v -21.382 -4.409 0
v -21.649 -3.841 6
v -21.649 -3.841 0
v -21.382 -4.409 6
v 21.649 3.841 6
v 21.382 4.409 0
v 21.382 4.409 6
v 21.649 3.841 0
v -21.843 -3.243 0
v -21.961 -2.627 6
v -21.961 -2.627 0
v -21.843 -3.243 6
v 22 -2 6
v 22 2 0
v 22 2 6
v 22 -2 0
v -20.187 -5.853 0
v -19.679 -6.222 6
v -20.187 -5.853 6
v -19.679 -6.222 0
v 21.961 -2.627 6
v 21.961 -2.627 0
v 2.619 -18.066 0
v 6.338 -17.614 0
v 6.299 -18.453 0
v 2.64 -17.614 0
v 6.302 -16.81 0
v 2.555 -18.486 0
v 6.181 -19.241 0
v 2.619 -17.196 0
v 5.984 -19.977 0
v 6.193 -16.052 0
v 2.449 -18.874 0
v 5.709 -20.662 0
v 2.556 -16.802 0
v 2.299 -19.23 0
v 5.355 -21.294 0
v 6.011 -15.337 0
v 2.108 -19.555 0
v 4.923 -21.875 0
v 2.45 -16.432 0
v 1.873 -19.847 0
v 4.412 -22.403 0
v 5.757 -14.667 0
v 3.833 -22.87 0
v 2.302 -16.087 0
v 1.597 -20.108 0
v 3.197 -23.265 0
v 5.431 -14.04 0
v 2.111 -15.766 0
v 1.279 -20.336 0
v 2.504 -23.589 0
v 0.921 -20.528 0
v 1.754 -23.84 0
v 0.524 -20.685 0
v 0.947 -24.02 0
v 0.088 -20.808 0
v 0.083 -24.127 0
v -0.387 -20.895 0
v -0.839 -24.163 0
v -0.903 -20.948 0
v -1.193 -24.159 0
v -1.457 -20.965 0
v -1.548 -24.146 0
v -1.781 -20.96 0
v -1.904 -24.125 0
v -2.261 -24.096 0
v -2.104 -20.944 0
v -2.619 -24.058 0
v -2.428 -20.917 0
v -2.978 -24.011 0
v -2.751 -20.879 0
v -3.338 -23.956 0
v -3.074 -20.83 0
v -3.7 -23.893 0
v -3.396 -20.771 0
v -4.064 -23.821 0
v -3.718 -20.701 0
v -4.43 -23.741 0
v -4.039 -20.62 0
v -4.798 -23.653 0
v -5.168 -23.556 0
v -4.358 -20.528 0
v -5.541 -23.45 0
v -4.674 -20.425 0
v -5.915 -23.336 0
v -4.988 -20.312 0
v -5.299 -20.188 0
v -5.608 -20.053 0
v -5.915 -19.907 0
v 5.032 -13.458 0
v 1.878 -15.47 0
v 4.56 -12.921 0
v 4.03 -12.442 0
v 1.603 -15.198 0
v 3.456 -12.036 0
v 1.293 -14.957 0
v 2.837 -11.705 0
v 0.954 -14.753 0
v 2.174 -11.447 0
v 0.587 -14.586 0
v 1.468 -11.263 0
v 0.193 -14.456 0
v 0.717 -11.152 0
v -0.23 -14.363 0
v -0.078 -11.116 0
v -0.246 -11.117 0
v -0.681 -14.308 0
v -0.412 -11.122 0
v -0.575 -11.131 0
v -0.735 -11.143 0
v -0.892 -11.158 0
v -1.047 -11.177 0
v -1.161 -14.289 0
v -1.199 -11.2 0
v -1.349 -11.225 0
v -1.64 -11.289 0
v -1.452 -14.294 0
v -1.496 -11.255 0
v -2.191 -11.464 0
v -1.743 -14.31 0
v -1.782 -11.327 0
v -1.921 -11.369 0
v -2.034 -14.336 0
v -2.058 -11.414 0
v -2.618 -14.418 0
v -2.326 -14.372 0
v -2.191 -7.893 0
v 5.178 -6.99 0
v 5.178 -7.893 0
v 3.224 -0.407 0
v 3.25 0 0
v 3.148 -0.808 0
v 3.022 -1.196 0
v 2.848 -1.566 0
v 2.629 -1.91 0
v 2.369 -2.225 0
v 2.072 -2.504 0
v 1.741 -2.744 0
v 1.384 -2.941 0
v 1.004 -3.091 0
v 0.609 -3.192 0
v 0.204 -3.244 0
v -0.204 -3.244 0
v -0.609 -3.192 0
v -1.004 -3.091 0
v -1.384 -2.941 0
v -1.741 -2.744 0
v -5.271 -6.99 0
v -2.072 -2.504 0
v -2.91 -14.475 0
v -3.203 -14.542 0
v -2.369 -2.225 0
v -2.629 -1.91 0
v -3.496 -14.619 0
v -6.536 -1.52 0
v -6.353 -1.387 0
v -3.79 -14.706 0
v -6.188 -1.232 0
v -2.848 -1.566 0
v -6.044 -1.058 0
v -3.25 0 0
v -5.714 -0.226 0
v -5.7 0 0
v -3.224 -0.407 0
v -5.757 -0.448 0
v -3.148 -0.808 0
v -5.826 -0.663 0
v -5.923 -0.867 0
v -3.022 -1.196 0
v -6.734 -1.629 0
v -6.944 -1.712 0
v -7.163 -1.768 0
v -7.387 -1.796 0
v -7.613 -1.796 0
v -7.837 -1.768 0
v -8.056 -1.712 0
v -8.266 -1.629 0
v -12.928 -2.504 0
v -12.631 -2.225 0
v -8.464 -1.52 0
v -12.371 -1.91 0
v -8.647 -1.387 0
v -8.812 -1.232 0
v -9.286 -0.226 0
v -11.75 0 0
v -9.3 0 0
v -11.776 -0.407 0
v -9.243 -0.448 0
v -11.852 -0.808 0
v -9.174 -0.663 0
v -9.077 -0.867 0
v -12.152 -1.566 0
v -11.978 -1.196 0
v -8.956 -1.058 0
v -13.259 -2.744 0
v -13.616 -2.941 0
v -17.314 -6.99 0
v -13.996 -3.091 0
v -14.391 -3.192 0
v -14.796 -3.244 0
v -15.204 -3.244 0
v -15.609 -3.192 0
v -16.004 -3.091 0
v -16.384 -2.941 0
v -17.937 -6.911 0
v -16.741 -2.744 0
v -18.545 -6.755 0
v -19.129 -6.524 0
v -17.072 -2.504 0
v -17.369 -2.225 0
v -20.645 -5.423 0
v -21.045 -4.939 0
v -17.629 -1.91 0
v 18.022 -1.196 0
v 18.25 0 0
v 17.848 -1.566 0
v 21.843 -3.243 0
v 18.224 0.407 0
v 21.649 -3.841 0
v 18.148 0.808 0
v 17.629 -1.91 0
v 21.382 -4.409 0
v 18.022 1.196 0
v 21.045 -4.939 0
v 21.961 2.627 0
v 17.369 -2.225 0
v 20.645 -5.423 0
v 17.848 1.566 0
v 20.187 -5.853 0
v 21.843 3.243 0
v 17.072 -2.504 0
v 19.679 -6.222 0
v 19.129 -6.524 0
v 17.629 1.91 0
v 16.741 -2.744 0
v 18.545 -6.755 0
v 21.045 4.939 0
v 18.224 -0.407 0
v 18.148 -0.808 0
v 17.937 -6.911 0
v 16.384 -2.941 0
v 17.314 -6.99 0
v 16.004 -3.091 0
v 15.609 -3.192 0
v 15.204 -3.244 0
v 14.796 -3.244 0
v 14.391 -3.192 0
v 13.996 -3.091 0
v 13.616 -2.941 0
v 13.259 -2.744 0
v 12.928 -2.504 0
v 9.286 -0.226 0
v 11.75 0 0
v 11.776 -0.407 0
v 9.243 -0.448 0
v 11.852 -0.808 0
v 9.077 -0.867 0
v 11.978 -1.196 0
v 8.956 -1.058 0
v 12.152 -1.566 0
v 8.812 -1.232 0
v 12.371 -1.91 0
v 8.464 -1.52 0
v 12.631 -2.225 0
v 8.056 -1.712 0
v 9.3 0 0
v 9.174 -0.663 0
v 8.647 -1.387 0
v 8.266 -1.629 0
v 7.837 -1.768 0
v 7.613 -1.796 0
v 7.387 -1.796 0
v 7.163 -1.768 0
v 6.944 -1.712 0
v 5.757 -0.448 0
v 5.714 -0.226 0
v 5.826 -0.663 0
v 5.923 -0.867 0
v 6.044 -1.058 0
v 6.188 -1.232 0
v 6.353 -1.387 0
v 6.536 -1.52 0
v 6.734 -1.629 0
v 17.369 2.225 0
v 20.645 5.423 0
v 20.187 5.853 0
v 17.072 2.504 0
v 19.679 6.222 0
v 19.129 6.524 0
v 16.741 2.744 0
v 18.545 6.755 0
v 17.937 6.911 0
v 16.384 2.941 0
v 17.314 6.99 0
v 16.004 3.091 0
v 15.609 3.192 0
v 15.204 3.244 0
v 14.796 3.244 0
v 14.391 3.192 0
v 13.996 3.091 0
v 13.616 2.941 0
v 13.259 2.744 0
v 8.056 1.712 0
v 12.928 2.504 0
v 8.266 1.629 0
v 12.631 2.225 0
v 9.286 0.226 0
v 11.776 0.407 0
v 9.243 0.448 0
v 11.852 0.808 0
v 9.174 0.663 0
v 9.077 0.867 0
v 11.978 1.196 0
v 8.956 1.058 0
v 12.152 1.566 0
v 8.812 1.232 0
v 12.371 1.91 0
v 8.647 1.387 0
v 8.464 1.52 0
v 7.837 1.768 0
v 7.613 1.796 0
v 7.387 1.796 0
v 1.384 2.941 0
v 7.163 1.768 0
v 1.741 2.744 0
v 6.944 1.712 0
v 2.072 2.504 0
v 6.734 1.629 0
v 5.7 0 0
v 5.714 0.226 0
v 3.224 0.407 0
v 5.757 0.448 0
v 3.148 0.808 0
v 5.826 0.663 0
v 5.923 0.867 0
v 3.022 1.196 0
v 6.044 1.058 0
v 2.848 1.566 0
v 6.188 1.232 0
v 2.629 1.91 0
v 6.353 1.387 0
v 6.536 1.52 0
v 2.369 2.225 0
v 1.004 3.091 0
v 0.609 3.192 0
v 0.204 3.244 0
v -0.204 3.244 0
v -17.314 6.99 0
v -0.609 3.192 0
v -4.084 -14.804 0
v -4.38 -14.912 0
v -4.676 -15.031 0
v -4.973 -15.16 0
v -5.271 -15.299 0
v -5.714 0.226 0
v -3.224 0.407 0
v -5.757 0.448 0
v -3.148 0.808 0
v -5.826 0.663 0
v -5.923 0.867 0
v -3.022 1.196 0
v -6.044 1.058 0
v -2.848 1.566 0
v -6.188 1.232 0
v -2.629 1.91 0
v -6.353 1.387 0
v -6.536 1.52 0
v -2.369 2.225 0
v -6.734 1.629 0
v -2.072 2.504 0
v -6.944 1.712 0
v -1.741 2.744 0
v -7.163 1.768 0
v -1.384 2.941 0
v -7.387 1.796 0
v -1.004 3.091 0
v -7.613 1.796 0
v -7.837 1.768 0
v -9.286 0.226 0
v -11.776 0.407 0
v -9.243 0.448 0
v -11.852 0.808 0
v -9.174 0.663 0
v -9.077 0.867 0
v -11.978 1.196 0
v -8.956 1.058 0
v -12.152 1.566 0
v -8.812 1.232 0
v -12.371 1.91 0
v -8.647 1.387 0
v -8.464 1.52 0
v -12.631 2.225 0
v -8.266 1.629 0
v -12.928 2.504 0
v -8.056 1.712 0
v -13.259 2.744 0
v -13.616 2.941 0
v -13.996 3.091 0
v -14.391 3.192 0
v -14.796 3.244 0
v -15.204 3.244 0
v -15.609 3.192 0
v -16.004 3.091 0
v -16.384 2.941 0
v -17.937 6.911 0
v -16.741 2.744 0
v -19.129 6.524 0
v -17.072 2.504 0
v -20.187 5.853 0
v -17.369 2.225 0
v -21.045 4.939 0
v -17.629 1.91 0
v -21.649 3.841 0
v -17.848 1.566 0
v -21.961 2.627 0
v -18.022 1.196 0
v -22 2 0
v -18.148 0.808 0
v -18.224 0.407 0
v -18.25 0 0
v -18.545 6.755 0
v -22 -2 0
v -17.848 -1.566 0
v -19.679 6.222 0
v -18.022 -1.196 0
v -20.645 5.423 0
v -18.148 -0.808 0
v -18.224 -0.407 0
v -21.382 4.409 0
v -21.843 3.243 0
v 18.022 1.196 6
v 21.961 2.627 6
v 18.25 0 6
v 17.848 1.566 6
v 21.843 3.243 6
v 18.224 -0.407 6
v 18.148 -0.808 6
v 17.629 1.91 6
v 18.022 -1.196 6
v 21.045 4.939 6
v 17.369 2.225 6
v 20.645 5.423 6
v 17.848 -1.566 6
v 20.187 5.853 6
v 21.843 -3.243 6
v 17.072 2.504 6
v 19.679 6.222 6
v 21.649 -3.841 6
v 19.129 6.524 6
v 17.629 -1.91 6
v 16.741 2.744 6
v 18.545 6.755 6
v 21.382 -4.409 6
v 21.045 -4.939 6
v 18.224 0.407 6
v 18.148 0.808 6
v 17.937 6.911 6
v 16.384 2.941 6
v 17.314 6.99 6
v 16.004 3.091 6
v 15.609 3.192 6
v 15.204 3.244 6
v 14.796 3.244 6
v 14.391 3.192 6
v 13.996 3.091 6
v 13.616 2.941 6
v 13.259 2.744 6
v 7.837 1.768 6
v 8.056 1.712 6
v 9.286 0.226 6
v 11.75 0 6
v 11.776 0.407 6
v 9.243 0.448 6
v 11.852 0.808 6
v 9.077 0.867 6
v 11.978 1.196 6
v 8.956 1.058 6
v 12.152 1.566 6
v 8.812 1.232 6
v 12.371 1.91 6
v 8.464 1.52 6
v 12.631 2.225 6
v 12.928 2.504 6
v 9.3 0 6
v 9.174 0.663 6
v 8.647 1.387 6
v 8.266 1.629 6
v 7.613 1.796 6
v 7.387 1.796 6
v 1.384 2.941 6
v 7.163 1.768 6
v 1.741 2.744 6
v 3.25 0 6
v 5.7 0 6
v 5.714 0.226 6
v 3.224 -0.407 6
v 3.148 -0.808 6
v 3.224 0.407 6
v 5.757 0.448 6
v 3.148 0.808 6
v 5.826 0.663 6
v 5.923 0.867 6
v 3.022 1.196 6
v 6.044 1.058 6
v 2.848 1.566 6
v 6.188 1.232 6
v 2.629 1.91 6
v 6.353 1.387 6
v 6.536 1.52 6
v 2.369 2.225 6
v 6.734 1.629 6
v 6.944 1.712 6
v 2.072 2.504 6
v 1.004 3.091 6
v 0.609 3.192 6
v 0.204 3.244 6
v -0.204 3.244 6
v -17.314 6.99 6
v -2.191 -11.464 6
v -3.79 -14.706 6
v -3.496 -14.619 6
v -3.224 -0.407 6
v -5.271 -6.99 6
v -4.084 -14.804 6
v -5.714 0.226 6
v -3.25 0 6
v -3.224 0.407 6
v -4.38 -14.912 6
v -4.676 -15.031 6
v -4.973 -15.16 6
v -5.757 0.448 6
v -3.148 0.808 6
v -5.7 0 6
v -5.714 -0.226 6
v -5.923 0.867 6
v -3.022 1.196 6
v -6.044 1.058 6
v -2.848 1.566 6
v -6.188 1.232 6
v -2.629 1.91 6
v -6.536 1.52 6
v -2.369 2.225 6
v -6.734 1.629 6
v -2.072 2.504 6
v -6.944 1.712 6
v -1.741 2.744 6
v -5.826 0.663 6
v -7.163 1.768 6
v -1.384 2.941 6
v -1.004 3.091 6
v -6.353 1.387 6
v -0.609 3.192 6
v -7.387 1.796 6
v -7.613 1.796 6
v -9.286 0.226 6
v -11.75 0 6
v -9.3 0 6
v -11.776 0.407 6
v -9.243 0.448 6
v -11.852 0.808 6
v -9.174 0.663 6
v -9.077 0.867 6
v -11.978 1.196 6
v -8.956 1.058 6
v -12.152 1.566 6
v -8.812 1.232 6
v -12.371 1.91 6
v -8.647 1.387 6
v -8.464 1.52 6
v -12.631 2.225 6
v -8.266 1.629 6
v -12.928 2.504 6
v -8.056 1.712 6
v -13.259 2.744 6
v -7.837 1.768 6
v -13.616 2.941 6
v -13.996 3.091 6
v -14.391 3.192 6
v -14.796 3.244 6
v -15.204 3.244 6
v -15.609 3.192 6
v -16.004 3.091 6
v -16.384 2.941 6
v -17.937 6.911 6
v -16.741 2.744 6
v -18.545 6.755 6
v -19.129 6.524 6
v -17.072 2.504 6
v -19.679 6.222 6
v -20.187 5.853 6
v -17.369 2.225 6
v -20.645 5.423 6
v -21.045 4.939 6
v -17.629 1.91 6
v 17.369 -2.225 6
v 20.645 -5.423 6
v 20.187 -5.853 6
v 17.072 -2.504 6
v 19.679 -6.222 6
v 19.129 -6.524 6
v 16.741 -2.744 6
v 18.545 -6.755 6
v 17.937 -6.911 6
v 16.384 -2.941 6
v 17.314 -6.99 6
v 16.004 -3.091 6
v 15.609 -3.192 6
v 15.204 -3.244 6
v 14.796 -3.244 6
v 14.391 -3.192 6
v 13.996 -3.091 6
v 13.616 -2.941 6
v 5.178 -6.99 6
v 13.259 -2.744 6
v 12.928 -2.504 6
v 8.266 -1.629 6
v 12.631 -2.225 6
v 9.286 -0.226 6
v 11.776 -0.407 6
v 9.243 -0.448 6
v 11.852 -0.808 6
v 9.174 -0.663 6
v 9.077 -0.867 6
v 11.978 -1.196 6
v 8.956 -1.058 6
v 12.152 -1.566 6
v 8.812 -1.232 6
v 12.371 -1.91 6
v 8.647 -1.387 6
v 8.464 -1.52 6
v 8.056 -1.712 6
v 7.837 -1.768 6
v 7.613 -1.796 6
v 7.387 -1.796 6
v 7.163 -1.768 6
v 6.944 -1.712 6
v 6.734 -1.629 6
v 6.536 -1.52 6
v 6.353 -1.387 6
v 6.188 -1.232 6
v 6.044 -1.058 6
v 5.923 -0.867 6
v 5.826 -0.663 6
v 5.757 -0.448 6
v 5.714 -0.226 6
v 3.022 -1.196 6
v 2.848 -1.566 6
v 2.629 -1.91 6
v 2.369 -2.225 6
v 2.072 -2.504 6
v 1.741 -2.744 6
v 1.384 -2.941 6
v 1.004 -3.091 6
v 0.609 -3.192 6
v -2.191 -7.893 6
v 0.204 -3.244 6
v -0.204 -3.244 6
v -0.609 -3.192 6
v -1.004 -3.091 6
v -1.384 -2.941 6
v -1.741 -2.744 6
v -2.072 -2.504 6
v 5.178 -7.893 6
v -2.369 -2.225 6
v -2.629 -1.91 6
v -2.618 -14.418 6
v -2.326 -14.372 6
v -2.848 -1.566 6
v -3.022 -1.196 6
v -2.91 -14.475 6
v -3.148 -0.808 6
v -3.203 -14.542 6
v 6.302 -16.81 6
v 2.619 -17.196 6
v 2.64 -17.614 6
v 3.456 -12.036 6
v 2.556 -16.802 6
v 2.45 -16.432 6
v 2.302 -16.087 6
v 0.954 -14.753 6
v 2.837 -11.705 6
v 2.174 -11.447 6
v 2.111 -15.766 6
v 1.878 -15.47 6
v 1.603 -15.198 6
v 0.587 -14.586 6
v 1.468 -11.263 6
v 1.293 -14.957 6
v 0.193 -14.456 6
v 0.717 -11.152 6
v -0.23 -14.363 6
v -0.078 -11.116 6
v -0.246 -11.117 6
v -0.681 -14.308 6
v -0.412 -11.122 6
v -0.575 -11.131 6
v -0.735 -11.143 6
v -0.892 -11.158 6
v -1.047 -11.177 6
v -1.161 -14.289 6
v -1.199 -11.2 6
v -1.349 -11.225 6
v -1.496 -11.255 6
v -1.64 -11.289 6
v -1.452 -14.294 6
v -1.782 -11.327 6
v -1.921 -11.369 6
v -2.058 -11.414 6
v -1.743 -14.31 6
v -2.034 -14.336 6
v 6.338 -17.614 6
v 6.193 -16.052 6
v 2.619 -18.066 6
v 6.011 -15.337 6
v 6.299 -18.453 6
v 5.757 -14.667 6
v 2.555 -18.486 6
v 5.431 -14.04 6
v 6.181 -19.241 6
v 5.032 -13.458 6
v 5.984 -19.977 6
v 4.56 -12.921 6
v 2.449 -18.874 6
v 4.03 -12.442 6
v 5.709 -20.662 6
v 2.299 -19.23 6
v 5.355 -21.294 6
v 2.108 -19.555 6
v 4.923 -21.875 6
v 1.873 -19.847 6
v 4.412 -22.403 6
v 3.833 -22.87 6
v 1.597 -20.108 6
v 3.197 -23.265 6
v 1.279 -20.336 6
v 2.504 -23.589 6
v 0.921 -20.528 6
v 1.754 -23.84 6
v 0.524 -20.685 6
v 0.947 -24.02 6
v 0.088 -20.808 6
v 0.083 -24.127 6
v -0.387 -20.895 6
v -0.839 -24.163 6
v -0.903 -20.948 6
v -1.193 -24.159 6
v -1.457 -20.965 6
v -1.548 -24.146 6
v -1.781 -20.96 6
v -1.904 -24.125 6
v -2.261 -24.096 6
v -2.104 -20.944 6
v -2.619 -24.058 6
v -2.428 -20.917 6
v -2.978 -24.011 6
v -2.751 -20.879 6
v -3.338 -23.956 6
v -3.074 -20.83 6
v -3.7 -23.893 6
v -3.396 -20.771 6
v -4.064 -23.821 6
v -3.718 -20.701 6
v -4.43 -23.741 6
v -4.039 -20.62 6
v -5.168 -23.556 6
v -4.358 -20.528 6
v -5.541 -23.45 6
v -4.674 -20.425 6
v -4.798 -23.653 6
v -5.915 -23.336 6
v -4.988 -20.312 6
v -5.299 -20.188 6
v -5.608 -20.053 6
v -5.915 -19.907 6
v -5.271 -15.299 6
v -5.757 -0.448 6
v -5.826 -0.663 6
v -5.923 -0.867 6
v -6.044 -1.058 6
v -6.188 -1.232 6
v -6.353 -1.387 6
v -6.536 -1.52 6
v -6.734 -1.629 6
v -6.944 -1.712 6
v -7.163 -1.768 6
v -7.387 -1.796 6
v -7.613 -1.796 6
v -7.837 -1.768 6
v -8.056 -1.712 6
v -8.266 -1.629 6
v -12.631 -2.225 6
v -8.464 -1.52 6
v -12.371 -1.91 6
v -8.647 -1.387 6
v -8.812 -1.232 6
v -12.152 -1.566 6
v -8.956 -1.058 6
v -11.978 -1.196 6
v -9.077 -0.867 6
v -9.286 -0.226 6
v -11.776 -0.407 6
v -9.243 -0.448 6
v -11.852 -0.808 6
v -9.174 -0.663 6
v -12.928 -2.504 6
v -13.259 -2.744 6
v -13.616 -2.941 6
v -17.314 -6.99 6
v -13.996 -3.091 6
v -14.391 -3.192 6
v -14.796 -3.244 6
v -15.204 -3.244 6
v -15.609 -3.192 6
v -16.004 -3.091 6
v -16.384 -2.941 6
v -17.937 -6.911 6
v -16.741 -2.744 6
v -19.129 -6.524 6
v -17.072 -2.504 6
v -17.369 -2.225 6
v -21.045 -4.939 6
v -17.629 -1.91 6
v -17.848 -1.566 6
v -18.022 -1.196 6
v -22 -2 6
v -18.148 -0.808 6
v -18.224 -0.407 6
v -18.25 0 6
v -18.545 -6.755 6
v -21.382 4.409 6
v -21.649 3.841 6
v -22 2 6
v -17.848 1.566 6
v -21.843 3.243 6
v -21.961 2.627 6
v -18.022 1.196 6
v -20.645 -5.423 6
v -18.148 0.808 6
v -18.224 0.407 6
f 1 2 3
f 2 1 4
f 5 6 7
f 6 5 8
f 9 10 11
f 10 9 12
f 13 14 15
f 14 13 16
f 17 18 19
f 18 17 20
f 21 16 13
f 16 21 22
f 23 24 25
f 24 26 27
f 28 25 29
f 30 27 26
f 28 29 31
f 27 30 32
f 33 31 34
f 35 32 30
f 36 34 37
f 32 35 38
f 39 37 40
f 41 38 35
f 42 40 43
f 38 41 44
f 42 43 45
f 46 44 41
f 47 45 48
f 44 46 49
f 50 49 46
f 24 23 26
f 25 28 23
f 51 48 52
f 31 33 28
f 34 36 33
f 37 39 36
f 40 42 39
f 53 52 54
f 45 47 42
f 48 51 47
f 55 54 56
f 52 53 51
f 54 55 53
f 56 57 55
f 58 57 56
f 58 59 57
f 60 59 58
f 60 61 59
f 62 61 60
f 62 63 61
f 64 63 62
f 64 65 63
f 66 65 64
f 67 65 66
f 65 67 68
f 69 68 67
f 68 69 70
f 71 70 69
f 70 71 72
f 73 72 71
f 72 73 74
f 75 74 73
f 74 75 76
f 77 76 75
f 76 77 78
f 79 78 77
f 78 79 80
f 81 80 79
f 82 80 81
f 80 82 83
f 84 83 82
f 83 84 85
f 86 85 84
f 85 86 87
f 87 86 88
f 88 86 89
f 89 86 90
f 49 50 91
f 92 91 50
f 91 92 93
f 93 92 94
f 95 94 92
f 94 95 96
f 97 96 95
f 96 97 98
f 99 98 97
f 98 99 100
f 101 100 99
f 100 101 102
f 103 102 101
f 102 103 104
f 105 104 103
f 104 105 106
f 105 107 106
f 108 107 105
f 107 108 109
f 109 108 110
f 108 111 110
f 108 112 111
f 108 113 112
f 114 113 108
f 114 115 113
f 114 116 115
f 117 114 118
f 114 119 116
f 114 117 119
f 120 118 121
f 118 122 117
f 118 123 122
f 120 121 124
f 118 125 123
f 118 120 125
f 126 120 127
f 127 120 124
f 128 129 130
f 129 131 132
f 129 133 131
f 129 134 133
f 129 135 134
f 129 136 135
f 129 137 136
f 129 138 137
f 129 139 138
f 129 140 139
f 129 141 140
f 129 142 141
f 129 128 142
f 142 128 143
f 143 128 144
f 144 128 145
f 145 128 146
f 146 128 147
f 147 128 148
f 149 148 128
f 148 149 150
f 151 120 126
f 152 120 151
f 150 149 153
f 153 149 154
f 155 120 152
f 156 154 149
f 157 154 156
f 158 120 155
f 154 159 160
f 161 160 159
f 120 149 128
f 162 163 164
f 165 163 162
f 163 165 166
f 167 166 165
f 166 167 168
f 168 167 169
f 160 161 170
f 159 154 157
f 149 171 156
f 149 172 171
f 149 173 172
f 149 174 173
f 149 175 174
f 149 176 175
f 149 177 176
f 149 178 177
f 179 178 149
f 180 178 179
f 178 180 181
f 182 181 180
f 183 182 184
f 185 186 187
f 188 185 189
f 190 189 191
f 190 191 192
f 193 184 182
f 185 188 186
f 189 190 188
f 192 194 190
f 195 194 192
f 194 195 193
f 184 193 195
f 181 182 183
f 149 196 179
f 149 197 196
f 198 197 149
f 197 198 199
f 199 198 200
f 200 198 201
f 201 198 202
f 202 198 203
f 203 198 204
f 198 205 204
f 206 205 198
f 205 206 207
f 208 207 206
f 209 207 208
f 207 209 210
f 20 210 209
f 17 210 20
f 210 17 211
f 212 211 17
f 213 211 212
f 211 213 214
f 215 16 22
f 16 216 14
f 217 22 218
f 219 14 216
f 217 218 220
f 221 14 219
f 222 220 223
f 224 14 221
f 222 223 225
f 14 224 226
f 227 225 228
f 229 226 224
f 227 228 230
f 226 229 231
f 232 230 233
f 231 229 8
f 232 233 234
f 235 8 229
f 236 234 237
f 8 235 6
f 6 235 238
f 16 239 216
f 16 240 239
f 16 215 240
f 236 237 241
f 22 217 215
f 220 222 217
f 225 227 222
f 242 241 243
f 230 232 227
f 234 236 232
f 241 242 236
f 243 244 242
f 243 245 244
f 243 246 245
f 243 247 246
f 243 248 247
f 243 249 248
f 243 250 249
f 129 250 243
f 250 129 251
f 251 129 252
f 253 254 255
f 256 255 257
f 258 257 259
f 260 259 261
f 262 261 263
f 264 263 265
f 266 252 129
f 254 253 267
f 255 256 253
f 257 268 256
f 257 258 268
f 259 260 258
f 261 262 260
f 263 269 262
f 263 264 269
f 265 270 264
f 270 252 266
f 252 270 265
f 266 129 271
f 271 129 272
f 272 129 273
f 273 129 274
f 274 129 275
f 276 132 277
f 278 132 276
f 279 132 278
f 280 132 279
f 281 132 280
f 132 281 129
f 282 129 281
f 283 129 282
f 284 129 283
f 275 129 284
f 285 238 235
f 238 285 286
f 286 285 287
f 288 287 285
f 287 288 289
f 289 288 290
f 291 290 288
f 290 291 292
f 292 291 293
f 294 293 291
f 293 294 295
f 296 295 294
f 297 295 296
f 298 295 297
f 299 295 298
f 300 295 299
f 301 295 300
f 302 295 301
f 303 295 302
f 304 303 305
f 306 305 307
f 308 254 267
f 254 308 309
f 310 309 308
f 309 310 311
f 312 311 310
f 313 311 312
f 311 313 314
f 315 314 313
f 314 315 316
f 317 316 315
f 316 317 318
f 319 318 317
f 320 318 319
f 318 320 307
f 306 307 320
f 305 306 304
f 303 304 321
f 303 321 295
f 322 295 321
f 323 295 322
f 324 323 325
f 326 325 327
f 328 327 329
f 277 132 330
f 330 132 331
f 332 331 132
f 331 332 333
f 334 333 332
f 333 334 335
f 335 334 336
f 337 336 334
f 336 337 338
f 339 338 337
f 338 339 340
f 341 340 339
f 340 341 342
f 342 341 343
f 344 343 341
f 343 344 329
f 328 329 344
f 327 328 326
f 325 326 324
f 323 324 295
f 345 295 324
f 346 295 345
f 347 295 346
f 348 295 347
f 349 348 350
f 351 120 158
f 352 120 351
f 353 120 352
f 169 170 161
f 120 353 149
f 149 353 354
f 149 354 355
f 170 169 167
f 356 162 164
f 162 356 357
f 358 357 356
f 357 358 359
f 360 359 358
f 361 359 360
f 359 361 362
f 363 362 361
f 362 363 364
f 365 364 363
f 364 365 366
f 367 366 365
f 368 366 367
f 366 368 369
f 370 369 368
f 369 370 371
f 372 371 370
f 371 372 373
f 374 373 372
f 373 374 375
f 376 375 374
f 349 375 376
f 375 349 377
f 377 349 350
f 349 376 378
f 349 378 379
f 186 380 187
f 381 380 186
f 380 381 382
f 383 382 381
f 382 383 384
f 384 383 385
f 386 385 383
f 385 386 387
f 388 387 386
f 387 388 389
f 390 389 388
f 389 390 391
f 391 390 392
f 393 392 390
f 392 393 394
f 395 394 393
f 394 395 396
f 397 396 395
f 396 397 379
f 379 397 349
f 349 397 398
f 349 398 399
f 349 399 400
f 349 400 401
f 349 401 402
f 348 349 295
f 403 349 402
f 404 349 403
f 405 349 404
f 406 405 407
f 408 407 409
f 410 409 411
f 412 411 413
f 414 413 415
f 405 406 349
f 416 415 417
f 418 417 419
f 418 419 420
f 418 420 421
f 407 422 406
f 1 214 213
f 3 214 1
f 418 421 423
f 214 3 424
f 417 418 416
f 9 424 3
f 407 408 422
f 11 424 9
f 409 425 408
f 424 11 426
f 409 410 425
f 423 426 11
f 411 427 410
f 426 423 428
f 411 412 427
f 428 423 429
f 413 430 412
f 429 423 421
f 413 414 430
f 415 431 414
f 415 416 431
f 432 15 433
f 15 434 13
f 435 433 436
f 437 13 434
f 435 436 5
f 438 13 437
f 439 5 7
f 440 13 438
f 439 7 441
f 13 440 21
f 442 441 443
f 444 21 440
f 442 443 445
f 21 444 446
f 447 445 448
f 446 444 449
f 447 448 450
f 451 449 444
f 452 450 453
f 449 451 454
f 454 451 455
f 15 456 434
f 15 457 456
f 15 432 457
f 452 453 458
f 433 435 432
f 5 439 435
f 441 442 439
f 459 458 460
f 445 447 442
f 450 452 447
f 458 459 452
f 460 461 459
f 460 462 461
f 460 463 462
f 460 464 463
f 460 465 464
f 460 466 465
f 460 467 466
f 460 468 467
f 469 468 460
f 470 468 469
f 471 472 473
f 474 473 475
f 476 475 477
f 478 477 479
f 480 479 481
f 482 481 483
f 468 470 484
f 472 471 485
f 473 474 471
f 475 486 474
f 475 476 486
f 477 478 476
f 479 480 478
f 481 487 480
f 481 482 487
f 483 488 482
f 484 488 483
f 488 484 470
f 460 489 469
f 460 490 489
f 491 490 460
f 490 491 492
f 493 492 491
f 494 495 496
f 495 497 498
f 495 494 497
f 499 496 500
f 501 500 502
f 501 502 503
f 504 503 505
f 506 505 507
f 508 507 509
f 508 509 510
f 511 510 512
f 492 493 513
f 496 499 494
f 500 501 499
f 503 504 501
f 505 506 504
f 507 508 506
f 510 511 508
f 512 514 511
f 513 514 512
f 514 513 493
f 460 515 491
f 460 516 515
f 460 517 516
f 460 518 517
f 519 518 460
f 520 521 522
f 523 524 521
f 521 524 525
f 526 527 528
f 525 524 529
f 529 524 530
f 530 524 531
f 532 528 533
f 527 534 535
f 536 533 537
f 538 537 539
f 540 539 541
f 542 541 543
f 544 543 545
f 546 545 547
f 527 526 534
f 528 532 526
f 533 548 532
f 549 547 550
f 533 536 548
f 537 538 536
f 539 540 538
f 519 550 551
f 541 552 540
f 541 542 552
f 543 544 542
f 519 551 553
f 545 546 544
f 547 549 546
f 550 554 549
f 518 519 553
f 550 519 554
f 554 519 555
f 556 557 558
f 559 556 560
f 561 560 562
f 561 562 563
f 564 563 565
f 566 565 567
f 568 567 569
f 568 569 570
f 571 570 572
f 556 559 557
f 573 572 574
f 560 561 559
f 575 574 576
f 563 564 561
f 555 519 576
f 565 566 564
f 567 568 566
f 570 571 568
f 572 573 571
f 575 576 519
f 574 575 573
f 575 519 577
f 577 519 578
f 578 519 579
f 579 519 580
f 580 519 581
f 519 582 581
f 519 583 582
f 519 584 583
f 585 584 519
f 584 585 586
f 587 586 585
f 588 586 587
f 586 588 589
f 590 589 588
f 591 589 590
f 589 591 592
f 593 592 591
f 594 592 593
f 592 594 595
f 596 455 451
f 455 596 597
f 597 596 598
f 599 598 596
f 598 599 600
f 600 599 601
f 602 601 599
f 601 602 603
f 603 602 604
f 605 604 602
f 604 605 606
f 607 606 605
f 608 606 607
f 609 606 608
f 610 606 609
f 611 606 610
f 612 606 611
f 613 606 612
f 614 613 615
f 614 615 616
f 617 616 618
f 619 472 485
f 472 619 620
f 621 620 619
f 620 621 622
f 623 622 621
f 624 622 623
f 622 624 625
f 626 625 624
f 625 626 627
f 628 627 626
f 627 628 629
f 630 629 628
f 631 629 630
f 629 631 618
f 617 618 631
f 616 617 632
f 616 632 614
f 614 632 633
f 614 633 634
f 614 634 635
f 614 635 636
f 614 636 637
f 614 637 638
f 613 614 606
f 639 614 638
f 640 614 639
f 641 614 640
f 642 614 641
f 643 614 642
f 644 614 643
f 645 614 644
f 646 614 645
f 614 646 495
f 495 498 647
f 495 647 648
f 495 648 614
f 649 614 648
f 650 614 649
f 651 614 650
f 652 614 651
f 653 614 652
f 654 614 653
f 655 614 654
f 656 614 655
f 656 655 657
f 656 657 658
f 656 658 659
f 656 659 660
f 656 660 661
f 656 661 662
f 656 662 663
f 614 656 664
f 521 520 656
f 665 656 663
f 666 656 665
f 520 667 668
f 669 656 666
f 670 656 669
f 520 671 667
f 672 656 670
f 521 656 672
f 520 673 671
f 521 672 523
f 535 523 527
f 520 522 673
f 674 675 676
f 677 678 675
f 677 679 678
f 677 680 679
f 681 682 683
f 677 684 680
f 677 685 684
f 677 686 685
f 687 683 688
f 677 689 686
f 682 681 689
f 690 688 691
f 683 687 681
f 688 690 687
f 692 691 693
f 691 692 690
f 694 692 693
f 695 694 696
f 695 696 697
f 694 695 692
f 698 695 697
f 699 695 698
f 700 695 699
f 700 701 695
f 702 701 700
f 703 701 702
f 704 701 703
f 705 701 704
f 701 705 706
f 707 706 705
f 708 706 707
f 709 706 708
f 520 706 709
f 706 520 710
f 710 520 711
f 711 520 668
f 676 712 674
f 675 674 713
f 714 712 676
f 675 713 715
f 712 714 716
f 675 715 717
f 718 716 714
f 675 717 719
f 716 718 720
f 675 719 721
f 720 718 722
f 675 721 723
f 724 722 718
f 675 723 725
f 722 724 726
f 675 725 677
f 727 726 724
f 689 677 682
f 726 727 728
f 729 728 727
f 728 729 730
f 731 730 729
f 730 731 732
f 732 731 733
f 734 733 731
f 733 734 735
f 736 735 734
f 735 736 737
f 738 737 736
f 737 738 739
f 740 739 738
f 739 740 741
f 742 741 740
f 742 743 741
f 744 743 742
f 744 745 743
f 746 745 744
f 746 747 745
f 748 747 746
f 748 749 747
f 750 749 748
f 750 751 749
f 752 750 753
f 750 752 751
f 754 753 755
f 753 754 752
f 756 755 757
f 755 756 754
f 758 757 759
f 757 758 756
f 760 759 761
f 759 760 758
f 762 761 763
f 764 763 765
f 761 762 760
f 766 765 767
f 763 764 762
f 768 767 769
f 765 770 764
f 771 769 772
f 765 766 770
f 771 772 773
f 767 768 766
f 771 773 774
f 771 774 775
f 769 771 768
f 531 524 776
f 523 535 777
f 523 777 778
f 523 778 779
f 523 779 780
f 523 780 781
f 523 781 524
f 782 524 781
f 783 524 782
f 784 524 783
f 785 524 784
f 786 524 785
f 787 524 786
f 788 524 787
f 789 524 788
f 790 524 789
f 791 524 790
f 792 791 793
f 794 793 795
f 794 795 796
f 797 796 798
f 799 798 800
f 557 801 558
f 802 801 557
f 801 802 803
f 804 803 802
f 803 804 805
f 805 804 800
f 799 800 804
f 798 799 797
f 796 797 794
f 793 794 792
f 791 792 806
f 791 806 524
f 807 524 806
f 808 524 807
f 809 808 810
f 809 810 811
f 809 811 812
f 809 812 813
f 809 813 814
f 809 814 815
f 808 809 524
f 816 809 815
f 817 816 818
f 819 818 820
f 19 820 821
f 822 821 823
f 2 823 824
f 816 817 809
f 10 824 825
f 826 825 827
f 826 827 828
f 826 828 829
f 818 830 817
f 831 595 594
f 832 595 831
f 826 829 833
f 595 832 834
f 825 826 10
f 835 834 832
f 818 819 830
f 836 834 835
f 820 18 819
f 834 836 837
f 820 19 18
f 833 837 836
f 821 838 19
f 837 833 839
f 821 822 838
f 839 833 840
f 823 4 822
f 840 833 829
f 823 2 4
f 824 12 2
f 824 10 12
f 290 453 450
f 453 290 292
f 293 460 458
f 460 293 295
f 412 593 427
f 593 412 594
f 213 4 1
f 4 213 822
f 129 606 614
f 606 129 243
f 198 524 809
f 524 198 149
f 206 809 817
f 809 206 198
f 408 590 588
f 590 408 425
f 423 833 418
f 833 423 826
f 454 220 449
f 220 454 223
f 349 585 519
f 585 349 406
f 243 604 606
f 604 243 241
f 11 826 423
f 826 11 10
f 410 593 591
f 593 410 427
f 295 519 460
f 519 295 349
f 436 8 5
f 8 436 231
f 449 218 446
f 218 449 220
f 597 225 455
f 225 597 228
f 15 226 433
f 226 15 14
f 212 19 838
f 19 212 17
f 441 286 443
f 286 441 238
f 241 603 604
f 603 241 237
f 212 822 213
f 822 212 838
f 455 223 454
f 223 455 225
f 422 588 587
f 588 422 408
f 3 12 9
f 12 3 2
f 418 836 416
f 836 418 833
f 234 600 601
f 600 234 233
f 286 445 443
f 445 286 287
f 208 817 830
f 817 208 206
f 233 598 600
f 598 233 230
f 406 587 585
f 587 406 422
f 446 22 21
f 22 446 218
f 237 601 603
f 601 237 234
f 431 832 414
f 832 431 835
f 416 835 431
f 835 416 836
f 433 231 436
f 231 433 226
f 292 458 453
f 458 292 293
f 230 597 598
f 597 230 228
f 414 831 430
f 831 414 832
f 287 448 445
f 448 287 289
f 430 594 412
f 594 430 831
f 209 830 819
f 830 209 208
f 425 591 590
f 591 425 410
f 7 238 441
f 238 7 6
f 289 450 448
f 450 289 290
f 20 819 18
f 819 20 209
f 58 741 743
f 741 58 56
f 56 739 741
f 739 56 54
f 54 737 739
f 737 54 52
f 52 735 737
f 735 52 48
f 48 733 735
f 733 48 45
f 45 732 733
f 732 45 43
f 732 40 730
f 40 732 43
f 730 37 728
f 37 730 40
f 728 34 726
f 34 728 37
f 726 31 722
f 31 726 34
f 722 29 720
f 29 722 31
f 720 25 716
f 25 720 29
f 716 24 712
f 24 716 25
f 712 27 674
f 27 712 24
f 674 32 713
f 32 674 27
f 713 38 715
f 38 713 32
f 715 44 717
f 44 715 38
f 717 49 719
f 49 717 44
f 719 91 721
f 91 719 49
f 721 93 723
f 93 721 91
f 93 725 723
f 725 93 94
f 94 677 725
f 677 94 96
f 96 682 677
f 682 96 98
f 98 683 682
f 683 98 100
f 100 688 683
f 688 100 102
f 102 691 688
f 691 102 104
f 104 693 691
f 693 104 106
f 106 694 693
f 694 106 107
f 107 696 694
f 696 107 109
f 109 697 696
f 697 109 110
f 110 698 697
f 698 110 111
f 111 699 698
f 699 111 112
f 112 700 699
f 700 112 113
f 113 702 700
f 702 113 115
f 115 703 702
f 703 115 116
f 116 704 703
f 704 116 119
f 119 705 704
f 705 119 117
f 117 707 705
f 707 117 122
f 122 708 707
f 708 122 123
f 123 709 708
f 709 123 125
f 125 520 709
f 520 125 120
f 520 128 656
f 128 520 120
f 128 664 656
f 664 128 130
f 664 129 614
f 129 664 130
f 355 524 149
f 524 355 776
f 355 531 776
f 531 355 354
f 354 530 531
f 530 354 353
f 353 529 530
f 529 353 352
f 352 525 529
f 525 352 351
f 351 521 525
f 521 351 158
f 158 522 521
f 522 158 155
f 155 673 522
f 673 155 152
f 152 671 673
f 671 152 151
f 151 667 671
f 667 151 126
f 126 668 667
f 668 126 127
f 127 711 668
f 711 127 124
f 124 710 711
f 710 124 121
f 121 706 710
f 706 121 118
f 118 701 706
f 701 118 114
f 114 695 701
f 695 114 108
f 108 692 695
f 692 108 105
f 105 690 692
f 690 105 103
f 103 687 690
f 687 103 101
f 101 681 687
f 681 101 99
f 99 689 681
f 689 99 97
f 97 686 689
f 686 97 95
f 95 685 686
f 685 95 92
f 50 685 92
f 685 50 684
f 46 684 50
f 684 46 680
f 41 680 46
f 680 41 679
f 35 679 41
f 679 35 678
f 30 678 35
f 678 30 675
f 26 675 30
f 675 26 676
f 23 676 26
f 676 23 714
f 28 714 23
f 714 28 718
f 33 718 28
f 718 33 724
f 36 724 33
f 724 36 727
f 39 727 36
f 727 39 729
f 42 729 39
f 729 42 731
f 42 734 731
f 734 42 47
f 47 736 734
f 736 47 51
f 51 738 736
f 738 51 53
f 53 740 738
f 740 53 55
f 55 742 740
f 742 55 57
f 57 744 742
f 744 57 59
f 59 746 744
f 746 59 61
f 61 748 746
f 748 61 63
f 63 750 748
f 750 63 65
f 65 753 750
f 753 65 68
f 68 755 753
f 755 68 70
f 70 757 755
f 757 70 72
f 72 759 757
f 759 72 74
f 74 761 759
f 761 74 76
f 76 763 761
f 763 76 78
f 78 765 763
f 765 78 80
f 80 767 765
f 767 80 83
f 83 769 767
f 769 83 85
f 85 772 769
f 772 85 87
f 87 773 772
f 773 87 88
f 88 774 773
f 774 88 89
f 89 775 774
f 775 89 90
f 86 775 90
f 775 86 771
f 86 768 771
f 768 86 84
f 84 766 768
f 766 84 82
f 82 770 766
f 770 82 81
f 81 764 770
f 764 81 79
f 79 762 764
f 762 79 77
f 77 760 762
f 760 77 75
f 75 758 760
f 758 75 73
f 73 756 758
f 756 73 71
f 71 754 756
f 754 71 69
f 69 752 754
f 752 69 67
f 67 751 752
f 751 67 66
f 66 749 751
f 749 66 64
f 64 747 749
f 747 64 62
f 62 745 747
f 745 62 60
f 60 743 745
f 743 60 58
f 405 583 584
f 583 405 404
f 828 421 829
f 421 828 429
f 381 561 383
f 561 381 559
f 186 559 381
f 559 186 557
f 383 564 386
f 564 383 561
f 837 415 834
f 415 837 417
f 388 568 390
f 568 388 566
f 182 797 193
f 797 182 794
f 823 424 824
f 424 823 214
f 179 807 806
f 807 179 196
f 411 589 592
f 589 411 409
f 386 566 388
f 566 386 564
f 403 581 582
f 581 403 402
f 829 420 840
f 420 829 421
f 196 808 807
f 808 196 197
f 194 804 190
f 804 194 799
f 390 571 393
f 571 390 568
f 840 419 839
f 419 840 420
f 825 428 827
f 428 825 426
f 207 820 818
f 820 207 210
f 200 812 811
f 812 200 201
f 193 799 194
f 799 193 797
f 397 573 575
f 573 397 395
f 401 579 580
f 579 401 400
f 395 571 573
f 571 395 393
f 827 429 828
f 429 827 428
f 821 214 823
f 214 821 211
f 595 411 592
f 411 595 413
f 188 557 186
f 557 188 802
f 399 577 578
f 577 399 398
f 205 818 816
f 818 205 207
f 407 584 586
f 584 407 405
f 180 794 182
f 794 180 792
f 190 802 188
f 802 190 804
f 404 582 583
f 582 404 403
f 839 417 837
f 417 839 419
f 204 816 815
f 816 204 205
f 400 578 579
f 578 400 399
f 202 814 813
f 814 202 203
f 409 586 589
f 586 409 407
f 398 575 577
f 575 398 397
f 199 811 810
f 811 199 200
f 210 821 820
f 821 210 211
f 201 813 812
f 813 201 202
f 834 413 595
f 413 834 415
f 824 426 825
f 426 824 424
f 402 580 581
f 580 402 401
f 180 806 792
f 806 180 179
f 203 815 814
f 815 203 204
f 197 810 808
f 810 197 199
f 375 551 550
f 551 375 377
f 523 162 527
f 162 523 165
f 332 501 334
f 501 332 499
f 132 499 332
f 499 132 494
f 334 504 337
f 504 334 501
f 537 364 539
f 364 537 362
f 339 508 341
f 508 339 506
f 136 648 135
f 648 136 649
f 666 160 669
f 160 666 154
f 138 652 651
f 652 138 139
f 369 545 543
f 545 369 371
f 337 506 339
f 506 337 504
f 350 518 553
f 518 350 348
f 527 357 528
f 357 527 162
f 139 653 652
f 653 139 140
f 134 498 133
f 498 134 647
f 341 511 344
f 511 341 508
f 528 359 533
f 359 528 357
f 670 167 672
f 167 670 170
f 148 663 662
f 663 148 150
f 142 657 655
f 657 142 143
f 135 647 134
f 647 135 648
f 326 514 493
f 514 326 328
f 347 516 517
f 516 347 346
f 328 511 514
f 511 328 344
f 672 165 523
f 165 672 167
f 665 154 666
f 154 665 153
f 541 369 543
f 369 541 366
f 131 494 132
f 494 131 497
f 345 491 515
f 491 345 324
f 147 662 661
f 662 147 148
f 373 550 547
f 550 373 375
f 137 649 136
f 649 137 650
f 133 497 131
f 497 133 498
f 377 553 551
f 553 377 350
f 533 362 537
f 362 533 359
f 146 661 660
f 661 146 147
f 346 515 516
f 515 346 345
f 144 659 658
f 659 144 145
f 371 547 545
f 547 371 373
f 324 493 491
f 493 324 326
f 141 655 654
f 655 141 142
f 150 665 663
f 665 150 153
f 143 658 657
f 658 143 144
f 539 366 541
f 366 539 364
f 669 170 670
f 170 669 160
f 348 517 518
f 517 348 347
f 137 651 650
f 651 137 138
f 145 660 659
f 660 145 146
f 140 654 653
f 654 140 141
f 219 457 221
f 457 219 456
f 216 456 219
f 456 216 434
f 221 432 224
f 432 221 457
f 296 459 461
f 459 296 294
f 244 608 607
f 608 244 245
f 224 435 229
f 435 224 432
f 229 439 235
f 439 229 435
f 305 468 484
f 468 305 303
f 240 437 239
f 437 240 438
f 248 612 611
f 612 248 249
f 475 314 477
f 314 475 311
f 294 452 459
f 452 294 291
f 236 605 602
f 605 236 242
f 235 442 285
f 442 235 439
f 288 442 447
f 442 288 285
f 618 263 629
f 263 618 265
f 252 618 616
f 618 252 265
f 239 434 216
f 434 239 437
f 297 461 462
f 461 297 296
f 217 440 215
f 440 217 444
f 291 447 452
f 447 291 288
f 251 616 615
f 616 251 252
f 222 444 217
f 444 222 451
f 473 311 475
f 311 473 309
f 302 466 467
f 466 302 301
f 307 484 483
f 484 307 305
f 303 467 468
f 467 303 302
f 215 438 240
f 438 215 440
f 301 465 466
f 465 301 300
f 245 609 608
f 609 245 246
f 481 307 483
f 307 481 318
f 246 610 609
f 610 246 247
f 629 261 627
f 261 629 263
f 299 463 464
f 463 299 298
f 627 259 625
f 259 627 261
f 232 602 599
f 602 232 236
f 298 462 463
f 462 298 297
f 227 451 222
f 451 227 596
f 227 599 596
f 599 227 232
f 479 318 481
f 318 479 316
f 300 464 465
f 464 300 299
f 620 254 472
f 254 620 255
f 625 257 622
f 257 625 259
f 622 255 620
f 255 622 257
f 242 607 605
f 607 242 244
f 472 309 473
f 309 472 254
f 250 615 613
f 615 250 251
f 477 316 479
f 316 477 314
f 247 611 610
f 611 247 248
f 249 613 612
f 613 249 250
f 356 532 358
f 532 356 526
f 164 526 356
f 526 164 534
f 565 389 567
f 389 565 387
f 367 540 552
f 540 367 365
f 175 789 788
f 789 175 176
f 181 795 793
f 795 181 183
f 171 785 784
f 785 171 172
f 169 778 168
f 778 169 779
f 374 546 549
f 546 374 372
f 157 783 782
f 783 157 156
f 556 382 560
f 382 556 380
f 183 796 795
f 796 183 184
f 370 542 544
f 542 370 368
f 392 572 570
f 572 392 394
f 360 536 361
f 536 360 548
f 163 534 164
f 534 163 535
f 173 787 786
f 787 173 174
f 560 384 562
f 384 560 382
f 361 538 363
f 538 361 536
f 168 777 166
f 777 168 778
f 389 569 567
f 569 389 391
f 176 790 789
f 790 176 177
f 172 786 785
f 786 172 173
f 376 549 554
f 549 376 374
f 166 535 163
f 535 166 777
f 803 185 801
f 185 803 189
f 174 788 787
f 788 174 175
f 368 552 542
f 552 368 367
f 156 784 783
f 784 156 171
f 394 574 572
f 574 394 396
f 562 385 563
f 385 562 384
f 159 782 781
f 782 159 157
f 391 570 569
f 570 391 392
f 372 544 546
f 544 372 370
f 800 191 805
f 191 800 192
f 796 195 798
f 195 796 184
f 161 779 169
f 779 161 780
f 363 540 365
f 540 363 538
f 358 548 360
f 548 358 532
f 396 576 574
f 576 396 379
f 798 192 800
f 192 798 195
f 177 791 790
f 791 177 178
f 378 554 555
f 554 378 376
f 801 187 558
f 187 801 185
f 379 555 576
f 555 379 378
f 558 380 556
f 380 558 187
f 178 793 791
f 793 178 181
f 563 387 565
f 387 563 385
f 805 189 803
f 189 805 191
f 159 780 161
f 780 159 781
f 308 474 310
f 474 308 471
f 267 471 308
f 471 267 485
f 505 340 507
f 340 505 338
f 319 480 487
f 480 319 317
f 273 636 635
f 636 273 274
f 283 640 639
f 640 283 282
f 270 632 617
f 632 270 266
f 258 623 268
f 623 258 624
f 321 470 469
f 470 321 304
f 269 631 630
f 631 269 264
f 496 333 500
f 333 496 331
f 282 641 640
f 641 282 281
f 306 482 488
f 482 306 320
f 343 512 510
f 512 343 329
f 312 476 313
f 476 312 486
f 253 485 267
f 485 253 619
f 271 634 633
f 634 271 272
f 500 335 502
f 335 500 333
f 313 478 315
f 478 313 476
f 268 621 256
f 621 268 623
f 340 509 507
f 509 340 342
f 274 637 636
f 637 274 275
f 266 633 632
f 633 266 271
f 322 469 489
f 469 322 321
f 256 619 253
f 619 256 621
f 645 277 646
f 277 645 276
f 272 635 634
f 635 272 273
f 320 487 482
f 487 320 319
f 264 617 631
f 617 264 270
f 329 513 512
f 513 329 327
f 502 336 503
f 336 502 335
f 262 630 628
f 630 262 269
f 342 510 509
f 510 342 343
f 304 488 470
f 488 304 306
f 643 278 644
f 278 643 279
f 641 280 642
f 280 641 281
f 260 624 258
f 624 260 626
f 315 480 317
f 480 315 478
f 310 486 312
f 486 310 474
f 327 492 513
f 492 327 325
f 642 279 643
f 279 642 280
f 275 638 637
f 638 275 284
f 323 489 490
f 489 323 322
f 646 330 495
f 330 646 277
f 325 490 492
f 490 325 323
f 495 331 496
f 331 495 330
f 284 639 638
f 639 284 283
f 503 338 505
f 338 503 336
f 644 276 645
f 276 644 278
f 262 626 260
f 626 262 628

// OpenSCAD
$fn = 50;


difference() {
	union() {
		hull() {
			translate(v = [-17.0000000000, 2.0000000000, 0]) {
				cylinder(h = 6, r = 5);
			}
			translate(v = [17.0000000000, 2.0000000000, 0]) {
				cylinder(h = 6, r = 5);
			}
			translate(v = [-17.0000000000, -2.0000000000, 0]) {
				cylinder(h = 6, r = 5);
			}
			translate(v = [17.0000000000, -2.0000000000, 0]) {
				cylinder(h = 6, r = 5);
			}
		}
		translate(v = [0, -5, 0]) {
			linear_extrude(height = 6) {
				text(font = "DejaVu Sans Mono:style=Bold", halign = "center", size = 19.0000000000, text = "5", valign = "top");
			}
		}
	}
	union() {
		translate(v = [-15.0000000000, 0.0000000000, 0]) {
			translate(v = [0, 0, -100]) {
				cylinder(h = 200, r = 3.2500000000);
			}
		}
		translate(v = [0, 0, -100]) {
			cylinder(h = 200, r = 3.2500000000);
		}
		translate(v = [15.0000000000, 0.0000000000, 0]) {
			translate(v = [0, 0, -100]) {
				cylinder(h = 200, r = 3.2500000000);
			}
		}
		translate(v = [-15.0000000000, 0.0000000000, 0]) {
			translate(v = [0, 0, -100]) {
				cylinder(h = 200, r = 1.8000000000);
			}
		}
		translate(v = [-7.5000000000, 0.0000000000, 0]) {
			translate(v = [0, 0, -100]) {
				cylinder(h = 200, r = 1.8000000000);
			}
		}
		translate(v = [0, 0, -100]) {
			cylinder(h = 200, r = 1.8000000000);
		}
		translate(v = [7.5000000000, 0.0000000000, 0]) {
			translate(v = [0, 0, -100]) {
				cylinder(h = 200, r = 1.8000000000);
			}
		}
		translate(v = [15.0000000000, 0.0000000000, 0]) {
			translate(v = [0, 0, -100]) {
				cylinder(h = 200, r = 1.8000000000);
			}
		}
	}
}
